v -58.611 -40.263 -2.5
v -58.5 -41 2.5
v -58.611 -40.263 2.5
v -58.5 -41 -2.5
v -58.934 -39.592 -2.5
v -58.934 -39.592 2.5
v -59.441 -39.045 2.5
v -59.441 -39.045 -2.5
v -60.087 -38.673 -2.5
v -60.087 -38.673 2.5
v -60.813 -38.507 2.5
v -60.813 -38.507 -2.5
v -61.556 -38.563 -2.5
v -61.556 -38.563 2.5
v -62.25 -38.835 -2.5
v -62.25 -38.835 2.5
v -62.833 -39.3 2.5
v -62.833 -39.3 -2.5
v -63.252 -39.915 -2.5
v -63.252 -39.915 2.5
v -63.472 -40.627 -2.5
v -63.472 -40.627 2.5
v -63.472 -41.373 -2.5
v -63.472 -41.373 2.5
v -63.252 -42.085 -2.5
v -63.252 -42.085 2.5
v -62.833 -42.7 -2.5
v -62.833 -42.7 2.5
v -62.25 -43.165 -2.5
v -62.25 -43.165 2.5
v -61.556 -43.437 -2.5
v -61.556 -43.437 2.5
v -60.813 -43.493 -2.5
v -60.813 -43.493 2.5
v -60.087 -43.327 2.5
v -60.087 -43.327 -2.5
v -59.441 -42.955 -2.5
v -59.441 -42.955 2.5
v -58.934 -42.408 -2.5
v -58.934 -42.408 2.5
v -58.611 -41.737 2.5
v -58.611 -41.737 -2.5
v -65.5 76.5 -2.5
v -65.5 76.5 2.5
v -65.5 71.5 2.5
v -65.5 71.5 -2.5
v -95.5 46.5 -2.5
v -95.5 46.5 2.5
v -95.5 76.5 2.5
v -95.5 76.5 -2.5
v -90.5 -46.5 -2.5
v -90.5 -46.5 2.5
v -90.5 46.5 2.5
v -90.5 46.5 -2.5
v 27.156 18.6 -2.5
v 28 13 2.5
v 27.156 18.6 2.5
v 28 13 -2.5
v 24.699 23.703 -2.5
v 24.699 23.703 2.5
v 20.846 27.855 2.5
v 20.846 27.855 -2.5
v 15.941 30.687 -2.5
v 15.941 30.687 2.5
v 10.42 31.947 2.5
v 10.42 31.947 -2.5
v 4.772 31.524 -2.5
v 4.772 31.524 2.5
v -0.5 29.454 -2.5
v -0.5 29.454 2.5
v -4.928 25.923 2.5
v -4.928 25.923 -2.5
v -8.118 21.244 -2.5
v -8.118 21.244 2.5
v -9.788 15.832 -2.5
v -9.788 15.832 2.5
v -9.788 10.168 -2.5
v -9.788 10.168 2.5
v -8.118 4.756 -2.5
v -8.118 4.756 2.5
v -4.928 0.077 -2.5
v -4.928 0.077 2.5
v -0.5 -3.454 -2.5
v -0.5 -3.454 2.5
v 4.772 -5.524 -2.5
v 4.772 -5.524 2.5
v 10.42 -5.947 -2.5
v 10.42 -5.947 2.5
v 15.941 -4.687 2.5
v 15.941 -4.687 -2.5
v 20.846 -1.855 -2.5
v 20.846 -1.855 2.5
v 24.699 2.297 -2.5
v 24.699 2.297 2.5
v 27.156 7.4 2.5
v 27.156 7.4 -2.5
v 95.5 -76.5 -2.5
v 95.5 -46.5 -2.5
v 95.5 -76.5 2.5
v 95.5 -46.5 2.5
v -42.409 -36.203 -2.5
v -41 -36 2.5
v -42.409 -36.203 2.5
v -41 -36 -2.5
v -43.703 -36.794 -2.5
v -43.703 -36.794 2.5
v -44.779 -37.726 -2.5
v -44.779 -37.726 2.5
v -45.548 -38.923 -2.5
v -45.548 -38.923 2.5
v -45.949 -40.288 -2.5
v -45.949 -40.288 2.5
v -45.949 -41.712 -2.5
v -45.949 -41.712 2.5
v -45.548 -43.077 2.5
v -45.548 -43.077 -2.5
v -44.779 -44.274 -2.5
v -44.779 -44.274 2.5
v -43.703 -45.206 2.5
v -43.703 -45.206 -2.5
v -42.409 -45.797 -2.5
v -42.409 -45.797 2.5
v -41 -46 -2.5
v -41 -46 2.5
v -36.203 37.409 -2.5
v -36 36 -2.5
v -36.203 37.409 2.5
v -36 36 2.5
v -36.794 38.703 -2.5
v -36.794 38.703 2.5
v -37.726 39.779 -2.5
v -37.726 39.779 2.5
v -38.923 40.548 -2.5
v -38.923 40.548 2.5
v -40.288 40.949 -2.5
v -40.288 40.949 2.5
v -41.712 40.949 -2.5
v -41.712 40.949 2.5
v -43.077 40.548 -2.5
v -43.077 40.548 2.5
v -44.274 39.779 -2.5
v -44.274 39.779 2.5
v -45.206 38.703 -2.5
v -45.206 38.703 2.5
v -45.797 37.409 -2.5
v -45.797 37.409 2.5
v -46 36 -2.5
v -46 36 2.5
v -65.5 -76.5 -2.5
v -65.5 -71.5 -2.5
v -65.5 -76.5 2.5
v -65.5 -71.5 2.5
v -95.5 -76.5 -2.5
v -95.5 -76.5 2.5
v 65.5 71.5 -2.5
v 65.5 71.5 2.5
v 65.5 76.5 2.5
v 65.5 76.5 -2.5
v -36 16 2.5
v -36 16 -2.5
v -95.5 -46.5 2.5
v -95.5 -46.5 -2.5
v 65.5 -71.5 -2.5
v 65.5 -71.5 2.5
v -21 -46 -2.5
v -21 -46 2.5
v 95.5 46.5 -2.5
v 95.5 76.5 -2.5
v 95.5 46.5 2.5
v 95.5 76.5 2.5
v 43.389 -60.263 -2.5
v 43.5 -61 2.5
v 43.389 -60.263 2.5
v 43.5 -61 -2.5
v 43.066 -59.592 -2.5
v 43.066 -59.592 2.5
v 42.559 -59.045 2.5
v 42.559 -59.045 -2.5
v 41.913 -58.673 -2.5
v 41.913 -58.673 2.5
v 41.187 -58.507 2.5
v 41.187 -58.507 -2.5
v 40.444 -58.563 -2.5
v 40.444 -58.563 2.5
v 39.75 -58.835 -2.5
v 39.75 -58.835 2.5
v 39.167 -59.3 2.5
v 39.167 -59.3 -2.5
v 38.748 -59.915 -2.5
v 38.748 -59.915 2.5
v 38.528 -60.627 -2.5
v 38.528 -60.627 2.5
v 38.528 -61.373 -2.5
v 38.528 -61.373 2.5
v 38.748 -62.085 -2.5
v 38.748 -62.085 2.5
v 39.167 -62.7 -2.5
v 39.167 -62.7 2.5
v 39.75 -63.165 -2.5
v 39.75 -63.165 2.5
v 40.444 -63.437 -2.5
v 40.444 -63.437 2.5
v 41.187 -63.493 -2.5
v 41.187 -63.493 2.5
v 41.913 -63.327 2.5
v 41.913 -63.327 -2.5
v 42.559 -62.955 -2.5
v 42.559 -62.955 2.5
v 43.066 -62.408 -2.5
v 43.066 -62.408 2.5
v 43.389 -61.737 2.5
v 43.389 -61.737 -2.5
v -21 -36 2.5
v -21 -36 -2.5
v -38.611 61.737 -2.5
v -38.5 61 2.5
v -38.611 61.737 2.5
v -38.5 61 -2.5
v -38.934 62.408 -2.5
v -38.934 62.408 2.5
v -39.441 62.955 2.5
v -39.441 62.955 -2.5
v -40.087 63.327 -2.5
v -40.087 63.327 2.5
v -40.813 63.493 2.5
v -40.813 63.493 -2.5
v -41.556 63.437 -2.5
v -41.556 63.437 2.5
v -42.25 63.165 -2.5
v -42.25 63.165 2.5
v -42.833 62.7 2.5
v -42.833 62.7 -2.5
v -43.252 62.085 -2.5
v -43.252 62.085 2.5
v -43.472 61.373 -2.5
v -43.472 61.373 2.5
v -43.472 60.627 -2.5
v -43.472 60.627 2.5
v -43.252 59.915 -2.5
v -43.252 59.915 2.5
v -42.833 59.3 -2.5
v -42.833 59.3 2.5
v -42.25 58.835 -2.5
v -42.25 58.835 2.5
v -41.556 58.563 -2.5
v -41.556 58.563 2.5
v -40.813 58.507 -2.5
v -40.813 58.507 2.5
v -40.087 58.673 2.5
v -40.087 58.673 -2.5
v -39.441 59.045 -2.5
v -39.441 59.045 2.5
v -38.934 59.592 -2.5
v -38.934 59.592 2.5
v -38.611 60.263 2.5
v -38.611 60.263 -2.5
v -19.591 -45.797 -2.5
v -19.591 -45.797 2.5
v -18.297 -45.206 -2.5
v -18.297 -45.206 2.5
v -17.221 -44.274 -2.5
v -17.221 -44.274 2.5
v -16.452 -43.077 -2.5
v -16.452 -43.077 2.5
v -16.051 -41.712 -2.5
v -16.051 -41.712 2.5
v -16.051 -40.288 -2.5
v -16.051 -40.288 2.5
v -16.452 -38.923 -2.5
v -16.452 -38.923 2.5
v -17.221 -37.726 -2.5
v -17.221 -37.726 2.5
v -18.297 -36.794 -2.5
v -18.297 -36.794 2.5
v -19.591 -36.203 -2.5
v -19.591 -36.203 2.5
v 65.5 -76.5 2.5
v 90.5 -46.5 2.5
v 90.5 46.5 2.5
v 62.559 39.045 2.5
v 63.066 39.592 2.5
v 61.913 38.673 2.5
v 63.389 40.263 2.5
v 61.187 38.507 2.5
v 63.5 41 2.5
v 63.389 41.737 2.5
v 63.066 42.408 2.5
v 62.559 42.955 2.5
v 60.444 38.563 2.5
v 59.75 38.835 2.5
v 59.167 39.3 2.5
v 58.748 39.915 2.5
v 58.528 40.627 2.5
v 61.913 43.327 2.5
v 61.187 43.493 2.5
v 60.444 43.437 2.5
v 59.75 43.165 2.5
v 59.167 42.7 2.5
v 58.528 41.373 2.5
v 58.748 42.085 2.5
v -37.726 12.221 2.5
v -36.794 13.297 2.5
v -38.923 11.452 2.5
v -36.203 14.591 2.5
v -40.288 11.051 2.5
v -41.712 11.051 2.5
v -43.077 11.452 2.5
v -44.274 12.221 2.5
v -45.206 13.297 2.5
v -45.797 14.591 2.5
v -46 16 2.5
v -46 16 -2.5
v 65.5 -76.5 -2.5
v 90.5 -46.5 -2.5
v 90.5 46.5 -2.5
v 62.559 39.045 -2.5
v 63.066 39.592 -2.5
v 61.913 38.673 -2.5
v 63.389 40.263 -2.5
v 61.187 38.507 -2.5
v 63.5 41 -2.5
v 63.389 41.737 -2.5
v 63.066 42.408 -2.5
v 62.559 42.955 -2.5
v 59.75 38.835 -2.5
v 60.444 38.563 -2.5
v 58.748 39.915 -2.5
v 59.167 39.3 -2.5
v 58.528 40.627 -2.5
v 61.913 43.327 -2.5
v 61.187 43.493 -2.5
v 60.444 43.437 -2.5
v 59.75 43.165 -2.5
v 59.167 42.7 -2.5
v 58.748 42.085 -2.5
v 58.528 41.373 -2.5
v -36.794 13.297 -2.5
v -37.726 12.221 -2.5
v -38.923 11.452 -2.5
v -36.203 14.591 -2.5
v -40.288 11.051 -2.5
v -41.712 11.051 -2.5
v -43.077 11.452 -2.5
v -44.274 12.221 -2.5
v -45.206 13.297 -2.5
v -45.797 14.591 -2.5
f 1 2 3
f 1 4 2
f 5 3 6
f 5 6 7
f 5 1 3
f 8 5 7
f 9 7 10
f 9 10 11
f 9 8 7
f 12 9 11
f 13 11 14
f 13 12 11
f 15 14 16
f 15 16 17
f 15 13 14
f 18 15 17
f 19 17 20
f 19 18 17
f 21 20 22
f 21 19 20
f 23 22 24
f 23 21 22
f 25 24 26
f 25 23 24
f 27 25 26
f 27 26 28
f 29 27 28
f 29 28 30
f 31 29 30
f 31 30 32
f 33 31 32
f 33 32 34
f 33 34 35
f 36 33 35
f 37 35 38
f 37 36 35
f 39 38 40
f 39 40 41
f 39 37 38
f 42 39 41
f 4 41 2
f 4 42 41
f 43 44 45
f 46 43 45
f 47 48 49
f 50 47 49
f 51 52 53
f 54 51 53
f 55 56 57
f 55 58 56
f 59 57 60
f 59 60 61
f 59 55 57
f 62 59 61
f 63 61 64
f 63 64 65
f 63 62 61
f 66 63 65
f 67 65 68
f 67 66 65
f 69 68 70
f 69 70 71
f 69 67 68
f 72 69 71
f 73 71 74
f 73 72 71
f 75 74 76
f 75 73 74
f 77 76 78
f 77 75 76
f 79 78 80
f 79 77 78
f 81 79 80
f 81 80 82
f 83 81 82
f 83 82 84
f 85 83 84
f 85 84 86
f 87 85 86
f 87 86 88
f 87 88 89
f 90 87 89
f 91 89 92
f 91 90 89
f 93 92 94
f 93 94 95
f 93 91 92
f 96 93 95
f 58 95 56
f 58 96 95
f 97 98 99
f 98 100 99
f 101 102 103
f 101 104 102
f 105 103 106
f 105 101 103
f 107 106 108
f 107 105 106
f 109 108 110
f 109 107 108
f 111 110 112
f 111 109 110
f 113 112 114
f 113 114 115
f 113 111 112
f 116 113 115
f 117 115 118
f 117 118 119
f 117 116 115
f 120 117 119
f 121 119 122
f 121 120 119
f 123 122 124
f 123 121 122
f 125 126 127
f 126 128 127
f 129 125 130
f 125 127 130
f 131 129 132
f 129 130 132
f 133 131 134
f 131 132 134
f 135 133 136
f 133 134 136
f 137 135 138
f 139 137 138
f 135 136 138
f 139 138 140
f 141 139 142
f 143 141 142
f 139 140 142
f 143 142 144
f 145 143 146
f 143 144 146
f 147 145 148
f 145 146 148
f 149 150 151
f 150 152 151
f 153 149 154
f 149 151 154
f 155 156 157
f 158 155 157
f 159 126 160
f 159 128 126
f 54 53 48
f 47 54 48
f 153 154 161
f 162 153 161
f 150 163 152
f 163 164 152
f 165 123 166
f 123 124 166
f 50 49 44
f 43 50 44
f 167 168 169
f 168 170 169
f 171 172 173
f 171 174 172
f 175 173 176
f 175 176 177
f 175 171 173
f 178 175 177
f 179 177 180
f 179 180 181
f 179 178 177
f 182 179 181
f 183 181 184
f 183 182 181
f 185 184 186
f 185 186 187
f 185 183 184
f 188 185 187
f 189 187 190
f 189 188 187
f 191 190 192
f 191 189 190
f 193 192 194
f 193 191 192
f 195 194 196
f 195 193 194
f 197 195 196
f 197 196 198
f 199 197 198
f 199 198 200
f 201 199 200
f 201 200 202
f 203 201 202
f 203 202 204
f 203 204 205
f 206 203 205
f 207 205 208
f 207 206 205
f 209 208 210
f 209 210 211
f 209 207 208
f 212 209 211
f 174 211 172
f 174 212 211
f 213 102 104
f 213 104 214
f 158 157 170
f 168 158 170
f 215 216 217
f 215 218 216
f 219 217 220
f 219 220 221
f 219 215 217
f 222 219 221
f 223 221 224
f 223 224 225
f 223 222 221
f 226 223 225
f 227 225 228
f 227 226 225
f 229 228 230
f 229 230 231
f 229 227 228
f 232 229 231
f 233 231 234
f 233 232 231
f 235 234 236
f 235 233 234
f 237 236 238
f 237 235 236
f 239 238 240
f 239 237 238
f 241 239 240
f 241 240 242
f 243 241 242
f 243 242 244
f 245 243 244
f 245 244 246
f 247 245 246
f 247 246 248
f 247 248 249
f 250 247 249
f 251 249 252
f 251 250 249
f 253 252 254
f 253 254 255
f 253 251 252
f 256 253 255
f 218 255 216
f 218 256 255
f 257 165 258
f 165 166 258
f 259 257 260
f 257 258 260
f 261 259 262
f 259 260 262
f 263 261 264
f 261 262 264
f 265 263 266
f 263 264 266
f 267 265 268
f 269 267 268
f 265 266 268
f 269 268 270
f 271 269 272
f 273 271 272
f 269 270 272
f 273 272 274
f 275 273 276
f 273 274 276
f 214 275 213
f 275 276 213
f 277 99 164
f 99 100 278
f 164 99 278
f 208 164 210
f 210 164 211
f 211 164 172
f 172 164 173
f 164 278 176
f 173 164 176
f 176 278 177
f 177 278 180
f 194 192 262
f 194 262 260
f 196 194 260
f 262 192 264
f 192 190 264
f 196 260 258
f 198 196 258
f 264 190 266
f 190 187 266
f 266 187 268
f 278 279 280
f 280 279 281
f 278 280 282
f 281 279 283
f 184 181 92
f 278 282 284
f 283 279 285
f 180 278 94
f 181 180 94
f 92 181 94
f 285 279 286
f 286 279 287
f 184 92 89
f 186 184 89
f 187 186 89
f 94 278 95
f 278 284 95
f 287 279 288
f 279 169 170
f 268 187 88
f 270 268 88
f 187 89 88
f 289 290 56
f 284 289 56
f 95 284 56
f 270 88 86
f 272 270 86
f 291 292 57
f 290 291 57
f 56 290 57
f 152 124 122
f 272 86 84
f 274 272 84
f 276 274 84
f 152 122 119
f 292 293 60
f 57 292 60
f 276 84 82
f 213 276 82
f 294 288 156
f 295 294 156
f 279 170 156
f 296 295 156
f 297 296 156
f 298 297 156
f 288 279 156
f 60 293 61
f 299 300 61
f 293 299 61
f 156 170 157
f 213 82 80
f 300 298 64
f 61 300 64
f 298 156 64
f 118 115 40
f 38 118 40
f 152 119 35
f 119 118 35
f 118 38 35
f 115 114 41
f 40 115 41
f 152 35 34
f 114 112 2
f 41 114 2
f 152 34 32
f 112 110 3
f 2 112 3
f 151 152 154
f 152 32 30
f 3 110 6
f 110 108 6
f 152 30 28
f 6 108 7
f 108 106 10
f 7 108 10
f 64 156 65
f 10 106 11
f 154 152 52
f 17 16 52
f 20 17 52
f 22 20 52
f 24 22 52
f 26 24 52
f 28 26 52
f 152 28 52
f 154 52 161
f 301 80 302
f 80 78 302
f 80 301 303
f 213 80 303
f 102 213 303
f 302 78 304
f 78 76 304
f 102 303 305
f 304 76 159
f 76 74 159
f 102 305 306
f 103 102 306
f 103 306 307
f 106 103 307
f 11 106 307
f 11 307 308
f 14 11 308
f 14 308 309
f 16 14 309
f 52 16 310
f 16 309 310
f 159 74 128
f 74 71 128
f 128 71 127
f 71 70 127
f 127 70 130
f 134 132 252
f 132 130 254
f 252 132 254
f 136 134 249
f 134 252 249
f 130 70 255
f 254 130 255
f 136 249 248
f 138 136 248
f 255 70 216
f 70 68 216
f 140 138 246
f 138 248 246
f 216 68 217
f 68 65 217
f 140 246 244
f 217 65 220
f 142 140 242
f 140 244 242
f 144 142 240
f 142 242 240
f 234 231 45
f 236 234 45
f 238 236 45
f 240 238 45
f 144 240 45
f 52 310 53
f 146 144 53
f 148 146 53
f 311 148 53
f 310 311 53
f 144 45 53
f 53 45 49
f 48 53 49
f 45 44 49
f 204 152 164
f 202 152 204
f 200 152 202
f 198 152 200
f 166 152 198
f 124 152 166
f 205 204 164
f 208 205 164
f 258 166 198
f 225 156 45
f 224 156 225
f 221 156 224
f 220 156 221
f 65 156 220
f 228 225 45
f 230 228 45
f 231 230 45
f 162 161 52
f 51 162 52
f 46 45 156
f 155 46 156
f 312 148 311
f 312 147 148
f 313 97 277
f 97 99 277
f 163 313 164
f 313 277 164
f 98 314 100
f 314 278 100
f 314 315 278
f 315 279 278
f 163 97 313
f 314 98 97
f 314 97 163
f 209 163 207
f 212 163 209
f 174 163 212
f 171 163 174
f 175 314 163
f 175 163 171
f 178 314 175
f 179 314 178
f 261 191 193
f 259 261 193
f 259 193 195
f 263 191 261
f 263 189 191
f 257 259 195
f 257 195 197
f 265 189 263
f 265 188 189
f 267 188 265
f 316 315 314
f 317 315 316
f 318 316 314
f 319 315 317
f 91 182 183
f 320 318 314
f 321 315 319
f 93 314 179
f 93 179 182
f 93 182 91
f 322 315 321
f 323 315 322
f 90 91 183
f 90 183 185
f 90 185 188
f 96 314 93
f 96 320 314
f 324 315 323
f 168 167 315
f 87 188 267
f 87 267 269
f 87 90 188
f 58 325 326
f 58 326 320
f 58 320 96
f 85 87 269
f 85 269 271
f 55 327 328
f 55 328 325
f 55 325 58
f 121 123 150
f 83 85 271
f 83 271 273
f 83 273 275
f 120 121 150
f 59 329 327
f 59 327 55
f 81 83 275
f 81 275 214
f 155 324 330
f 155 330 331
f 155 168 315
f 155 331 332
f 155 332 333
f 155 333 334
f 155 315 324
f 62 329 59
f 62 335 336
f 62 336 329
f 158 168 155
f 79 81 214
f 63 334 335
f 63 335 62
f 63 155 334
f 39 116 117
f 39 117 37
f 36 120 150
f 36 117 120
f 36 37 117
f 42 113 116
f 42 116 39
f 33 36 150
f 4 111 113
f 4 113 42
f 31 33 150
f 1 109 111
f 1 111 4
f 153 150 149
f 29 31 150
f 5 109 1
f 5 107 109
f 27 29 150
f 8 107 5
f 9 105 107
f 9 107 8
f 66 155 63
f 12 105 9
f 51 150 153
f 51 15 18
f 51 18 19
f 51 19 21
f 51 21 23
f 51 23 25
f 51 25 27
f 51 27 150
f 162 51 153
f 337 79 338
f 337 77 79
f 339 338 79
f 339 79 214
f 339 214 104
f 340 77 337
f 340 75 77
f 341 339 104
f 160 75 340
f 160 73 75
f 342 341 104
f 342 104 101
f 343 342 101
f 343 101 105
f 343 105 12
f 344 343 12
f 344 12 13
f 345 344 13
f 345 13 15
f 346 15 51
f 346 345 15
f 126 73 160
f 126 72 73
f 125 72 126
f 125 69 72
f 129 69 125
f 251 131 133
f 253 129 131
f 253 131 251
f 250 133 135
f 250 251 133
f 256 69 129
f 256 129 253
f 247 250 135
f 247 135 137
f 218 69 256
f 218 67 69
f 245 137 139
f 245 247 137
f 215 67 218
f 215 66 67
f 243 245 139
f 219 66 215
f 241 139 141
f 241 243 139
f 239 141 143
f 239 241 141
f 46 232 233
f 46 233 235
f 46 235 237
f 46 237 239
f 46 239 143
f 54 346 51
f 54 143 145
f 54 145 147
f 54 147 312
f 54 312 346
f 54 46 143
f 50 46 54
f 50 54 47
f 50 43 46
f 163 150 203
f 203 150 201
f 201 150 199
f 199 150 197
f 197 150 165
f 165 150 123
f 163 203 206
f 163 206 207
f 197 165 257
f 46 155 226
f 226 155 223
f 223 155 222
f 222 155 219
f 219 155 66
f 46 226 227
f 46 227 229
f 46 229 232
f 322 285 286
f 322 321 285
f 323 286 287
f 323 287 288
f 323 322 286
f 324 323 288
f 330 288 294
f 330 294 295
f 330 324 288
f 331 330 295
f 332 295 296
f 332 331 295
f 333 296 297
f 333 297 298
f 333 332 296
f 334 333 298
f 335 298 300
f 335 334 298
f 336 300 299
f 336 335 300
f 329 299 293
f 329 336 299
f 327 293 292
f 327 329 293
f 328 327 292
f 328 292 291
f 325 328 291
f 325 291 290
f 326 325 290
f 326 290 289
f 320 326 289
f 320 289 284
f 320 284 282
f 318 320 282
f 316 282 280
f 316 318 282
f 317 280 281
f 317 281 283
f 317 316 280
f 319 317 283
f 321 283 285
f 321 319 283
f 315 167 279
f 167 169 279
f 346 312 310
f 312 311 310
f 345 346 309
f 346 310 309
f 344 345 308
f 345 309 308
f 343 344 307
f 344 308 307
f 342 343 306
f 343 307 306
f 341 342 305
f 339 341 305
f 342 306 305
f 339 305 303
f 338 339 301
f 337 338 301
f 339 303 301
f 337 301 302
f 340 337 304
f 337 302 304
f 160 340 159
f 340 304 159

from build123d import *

# Parameters (mm, degrees)
SKETCH_R   = 2.5
SKETCH_R_2 = 19
PAD_DEPTH  = 2.5


with BuildPart() as part:
    # Sketch → Pad (new body, symmetric)
    with BuildSketch(Plane.XY):
        Polygon((65.5, 76.5), (95.5, 76.5), (95.5, 46.5), (90.5, 46.5), (90.5, -46.5), (95.5, -46.5), (95.5, -76.5), (65.5, -76.5), (65.5, -71.5), (-65.5, -71.5), (-65.5, -76.5), (-95.5, -76.5), (-95.5, -46.5), (-90.5, -46.5), (-90.5, 46.5), (-95.5, 46.5), (-95.5, 76.5), (-65.5, 76.5), (-65.5, 71.5), (65.5, 71.5), align=None)
        with Locations((-61, -41)):
            Circle(SKETCH_R, mode=Mode.SUBTRACT)
        with Locations((41, -61)):
            Circle(SKETCH_R, mode=Mode.SUBTRACT)
        with Locations((9, 13)):
            Circle(SKETCH_R_2, mode=Mode.SUBTRACT)
        with Locations((61, 41)):
            Circle(SKETCH_R, mode=Mode.SUBTRACT)
        with Locations((-41, 61)):
            Circle(SKETCH_R, mode=Mode.SUBTRACT)
        with BuildLine():
            ThreePointArc((-36, 36), (-41, 41), (-46, 36))
            Line((-46, 36), (-46, 16))
            ThreePointArc((-46, 16), (-41, 11), (-36, 16))
            Line((-36, 36), (-36, 16))
        make_face(mode=Mode.SUBTRACT)
        with BuildLine():
            ThreePointArc((-41, -36), (-46, -41), (-41, -46))
            Line((-41, -46), (-21, -46))
            ThreePointArc((-21, -46), (-16, -41), (-21, -36))
            Line((-41, -36), (-21, -36))
        make_face(mode=Mode.SUBTRACT)
    extrude(amount=PAD_DEPTH, both=True)


solid = part.part
